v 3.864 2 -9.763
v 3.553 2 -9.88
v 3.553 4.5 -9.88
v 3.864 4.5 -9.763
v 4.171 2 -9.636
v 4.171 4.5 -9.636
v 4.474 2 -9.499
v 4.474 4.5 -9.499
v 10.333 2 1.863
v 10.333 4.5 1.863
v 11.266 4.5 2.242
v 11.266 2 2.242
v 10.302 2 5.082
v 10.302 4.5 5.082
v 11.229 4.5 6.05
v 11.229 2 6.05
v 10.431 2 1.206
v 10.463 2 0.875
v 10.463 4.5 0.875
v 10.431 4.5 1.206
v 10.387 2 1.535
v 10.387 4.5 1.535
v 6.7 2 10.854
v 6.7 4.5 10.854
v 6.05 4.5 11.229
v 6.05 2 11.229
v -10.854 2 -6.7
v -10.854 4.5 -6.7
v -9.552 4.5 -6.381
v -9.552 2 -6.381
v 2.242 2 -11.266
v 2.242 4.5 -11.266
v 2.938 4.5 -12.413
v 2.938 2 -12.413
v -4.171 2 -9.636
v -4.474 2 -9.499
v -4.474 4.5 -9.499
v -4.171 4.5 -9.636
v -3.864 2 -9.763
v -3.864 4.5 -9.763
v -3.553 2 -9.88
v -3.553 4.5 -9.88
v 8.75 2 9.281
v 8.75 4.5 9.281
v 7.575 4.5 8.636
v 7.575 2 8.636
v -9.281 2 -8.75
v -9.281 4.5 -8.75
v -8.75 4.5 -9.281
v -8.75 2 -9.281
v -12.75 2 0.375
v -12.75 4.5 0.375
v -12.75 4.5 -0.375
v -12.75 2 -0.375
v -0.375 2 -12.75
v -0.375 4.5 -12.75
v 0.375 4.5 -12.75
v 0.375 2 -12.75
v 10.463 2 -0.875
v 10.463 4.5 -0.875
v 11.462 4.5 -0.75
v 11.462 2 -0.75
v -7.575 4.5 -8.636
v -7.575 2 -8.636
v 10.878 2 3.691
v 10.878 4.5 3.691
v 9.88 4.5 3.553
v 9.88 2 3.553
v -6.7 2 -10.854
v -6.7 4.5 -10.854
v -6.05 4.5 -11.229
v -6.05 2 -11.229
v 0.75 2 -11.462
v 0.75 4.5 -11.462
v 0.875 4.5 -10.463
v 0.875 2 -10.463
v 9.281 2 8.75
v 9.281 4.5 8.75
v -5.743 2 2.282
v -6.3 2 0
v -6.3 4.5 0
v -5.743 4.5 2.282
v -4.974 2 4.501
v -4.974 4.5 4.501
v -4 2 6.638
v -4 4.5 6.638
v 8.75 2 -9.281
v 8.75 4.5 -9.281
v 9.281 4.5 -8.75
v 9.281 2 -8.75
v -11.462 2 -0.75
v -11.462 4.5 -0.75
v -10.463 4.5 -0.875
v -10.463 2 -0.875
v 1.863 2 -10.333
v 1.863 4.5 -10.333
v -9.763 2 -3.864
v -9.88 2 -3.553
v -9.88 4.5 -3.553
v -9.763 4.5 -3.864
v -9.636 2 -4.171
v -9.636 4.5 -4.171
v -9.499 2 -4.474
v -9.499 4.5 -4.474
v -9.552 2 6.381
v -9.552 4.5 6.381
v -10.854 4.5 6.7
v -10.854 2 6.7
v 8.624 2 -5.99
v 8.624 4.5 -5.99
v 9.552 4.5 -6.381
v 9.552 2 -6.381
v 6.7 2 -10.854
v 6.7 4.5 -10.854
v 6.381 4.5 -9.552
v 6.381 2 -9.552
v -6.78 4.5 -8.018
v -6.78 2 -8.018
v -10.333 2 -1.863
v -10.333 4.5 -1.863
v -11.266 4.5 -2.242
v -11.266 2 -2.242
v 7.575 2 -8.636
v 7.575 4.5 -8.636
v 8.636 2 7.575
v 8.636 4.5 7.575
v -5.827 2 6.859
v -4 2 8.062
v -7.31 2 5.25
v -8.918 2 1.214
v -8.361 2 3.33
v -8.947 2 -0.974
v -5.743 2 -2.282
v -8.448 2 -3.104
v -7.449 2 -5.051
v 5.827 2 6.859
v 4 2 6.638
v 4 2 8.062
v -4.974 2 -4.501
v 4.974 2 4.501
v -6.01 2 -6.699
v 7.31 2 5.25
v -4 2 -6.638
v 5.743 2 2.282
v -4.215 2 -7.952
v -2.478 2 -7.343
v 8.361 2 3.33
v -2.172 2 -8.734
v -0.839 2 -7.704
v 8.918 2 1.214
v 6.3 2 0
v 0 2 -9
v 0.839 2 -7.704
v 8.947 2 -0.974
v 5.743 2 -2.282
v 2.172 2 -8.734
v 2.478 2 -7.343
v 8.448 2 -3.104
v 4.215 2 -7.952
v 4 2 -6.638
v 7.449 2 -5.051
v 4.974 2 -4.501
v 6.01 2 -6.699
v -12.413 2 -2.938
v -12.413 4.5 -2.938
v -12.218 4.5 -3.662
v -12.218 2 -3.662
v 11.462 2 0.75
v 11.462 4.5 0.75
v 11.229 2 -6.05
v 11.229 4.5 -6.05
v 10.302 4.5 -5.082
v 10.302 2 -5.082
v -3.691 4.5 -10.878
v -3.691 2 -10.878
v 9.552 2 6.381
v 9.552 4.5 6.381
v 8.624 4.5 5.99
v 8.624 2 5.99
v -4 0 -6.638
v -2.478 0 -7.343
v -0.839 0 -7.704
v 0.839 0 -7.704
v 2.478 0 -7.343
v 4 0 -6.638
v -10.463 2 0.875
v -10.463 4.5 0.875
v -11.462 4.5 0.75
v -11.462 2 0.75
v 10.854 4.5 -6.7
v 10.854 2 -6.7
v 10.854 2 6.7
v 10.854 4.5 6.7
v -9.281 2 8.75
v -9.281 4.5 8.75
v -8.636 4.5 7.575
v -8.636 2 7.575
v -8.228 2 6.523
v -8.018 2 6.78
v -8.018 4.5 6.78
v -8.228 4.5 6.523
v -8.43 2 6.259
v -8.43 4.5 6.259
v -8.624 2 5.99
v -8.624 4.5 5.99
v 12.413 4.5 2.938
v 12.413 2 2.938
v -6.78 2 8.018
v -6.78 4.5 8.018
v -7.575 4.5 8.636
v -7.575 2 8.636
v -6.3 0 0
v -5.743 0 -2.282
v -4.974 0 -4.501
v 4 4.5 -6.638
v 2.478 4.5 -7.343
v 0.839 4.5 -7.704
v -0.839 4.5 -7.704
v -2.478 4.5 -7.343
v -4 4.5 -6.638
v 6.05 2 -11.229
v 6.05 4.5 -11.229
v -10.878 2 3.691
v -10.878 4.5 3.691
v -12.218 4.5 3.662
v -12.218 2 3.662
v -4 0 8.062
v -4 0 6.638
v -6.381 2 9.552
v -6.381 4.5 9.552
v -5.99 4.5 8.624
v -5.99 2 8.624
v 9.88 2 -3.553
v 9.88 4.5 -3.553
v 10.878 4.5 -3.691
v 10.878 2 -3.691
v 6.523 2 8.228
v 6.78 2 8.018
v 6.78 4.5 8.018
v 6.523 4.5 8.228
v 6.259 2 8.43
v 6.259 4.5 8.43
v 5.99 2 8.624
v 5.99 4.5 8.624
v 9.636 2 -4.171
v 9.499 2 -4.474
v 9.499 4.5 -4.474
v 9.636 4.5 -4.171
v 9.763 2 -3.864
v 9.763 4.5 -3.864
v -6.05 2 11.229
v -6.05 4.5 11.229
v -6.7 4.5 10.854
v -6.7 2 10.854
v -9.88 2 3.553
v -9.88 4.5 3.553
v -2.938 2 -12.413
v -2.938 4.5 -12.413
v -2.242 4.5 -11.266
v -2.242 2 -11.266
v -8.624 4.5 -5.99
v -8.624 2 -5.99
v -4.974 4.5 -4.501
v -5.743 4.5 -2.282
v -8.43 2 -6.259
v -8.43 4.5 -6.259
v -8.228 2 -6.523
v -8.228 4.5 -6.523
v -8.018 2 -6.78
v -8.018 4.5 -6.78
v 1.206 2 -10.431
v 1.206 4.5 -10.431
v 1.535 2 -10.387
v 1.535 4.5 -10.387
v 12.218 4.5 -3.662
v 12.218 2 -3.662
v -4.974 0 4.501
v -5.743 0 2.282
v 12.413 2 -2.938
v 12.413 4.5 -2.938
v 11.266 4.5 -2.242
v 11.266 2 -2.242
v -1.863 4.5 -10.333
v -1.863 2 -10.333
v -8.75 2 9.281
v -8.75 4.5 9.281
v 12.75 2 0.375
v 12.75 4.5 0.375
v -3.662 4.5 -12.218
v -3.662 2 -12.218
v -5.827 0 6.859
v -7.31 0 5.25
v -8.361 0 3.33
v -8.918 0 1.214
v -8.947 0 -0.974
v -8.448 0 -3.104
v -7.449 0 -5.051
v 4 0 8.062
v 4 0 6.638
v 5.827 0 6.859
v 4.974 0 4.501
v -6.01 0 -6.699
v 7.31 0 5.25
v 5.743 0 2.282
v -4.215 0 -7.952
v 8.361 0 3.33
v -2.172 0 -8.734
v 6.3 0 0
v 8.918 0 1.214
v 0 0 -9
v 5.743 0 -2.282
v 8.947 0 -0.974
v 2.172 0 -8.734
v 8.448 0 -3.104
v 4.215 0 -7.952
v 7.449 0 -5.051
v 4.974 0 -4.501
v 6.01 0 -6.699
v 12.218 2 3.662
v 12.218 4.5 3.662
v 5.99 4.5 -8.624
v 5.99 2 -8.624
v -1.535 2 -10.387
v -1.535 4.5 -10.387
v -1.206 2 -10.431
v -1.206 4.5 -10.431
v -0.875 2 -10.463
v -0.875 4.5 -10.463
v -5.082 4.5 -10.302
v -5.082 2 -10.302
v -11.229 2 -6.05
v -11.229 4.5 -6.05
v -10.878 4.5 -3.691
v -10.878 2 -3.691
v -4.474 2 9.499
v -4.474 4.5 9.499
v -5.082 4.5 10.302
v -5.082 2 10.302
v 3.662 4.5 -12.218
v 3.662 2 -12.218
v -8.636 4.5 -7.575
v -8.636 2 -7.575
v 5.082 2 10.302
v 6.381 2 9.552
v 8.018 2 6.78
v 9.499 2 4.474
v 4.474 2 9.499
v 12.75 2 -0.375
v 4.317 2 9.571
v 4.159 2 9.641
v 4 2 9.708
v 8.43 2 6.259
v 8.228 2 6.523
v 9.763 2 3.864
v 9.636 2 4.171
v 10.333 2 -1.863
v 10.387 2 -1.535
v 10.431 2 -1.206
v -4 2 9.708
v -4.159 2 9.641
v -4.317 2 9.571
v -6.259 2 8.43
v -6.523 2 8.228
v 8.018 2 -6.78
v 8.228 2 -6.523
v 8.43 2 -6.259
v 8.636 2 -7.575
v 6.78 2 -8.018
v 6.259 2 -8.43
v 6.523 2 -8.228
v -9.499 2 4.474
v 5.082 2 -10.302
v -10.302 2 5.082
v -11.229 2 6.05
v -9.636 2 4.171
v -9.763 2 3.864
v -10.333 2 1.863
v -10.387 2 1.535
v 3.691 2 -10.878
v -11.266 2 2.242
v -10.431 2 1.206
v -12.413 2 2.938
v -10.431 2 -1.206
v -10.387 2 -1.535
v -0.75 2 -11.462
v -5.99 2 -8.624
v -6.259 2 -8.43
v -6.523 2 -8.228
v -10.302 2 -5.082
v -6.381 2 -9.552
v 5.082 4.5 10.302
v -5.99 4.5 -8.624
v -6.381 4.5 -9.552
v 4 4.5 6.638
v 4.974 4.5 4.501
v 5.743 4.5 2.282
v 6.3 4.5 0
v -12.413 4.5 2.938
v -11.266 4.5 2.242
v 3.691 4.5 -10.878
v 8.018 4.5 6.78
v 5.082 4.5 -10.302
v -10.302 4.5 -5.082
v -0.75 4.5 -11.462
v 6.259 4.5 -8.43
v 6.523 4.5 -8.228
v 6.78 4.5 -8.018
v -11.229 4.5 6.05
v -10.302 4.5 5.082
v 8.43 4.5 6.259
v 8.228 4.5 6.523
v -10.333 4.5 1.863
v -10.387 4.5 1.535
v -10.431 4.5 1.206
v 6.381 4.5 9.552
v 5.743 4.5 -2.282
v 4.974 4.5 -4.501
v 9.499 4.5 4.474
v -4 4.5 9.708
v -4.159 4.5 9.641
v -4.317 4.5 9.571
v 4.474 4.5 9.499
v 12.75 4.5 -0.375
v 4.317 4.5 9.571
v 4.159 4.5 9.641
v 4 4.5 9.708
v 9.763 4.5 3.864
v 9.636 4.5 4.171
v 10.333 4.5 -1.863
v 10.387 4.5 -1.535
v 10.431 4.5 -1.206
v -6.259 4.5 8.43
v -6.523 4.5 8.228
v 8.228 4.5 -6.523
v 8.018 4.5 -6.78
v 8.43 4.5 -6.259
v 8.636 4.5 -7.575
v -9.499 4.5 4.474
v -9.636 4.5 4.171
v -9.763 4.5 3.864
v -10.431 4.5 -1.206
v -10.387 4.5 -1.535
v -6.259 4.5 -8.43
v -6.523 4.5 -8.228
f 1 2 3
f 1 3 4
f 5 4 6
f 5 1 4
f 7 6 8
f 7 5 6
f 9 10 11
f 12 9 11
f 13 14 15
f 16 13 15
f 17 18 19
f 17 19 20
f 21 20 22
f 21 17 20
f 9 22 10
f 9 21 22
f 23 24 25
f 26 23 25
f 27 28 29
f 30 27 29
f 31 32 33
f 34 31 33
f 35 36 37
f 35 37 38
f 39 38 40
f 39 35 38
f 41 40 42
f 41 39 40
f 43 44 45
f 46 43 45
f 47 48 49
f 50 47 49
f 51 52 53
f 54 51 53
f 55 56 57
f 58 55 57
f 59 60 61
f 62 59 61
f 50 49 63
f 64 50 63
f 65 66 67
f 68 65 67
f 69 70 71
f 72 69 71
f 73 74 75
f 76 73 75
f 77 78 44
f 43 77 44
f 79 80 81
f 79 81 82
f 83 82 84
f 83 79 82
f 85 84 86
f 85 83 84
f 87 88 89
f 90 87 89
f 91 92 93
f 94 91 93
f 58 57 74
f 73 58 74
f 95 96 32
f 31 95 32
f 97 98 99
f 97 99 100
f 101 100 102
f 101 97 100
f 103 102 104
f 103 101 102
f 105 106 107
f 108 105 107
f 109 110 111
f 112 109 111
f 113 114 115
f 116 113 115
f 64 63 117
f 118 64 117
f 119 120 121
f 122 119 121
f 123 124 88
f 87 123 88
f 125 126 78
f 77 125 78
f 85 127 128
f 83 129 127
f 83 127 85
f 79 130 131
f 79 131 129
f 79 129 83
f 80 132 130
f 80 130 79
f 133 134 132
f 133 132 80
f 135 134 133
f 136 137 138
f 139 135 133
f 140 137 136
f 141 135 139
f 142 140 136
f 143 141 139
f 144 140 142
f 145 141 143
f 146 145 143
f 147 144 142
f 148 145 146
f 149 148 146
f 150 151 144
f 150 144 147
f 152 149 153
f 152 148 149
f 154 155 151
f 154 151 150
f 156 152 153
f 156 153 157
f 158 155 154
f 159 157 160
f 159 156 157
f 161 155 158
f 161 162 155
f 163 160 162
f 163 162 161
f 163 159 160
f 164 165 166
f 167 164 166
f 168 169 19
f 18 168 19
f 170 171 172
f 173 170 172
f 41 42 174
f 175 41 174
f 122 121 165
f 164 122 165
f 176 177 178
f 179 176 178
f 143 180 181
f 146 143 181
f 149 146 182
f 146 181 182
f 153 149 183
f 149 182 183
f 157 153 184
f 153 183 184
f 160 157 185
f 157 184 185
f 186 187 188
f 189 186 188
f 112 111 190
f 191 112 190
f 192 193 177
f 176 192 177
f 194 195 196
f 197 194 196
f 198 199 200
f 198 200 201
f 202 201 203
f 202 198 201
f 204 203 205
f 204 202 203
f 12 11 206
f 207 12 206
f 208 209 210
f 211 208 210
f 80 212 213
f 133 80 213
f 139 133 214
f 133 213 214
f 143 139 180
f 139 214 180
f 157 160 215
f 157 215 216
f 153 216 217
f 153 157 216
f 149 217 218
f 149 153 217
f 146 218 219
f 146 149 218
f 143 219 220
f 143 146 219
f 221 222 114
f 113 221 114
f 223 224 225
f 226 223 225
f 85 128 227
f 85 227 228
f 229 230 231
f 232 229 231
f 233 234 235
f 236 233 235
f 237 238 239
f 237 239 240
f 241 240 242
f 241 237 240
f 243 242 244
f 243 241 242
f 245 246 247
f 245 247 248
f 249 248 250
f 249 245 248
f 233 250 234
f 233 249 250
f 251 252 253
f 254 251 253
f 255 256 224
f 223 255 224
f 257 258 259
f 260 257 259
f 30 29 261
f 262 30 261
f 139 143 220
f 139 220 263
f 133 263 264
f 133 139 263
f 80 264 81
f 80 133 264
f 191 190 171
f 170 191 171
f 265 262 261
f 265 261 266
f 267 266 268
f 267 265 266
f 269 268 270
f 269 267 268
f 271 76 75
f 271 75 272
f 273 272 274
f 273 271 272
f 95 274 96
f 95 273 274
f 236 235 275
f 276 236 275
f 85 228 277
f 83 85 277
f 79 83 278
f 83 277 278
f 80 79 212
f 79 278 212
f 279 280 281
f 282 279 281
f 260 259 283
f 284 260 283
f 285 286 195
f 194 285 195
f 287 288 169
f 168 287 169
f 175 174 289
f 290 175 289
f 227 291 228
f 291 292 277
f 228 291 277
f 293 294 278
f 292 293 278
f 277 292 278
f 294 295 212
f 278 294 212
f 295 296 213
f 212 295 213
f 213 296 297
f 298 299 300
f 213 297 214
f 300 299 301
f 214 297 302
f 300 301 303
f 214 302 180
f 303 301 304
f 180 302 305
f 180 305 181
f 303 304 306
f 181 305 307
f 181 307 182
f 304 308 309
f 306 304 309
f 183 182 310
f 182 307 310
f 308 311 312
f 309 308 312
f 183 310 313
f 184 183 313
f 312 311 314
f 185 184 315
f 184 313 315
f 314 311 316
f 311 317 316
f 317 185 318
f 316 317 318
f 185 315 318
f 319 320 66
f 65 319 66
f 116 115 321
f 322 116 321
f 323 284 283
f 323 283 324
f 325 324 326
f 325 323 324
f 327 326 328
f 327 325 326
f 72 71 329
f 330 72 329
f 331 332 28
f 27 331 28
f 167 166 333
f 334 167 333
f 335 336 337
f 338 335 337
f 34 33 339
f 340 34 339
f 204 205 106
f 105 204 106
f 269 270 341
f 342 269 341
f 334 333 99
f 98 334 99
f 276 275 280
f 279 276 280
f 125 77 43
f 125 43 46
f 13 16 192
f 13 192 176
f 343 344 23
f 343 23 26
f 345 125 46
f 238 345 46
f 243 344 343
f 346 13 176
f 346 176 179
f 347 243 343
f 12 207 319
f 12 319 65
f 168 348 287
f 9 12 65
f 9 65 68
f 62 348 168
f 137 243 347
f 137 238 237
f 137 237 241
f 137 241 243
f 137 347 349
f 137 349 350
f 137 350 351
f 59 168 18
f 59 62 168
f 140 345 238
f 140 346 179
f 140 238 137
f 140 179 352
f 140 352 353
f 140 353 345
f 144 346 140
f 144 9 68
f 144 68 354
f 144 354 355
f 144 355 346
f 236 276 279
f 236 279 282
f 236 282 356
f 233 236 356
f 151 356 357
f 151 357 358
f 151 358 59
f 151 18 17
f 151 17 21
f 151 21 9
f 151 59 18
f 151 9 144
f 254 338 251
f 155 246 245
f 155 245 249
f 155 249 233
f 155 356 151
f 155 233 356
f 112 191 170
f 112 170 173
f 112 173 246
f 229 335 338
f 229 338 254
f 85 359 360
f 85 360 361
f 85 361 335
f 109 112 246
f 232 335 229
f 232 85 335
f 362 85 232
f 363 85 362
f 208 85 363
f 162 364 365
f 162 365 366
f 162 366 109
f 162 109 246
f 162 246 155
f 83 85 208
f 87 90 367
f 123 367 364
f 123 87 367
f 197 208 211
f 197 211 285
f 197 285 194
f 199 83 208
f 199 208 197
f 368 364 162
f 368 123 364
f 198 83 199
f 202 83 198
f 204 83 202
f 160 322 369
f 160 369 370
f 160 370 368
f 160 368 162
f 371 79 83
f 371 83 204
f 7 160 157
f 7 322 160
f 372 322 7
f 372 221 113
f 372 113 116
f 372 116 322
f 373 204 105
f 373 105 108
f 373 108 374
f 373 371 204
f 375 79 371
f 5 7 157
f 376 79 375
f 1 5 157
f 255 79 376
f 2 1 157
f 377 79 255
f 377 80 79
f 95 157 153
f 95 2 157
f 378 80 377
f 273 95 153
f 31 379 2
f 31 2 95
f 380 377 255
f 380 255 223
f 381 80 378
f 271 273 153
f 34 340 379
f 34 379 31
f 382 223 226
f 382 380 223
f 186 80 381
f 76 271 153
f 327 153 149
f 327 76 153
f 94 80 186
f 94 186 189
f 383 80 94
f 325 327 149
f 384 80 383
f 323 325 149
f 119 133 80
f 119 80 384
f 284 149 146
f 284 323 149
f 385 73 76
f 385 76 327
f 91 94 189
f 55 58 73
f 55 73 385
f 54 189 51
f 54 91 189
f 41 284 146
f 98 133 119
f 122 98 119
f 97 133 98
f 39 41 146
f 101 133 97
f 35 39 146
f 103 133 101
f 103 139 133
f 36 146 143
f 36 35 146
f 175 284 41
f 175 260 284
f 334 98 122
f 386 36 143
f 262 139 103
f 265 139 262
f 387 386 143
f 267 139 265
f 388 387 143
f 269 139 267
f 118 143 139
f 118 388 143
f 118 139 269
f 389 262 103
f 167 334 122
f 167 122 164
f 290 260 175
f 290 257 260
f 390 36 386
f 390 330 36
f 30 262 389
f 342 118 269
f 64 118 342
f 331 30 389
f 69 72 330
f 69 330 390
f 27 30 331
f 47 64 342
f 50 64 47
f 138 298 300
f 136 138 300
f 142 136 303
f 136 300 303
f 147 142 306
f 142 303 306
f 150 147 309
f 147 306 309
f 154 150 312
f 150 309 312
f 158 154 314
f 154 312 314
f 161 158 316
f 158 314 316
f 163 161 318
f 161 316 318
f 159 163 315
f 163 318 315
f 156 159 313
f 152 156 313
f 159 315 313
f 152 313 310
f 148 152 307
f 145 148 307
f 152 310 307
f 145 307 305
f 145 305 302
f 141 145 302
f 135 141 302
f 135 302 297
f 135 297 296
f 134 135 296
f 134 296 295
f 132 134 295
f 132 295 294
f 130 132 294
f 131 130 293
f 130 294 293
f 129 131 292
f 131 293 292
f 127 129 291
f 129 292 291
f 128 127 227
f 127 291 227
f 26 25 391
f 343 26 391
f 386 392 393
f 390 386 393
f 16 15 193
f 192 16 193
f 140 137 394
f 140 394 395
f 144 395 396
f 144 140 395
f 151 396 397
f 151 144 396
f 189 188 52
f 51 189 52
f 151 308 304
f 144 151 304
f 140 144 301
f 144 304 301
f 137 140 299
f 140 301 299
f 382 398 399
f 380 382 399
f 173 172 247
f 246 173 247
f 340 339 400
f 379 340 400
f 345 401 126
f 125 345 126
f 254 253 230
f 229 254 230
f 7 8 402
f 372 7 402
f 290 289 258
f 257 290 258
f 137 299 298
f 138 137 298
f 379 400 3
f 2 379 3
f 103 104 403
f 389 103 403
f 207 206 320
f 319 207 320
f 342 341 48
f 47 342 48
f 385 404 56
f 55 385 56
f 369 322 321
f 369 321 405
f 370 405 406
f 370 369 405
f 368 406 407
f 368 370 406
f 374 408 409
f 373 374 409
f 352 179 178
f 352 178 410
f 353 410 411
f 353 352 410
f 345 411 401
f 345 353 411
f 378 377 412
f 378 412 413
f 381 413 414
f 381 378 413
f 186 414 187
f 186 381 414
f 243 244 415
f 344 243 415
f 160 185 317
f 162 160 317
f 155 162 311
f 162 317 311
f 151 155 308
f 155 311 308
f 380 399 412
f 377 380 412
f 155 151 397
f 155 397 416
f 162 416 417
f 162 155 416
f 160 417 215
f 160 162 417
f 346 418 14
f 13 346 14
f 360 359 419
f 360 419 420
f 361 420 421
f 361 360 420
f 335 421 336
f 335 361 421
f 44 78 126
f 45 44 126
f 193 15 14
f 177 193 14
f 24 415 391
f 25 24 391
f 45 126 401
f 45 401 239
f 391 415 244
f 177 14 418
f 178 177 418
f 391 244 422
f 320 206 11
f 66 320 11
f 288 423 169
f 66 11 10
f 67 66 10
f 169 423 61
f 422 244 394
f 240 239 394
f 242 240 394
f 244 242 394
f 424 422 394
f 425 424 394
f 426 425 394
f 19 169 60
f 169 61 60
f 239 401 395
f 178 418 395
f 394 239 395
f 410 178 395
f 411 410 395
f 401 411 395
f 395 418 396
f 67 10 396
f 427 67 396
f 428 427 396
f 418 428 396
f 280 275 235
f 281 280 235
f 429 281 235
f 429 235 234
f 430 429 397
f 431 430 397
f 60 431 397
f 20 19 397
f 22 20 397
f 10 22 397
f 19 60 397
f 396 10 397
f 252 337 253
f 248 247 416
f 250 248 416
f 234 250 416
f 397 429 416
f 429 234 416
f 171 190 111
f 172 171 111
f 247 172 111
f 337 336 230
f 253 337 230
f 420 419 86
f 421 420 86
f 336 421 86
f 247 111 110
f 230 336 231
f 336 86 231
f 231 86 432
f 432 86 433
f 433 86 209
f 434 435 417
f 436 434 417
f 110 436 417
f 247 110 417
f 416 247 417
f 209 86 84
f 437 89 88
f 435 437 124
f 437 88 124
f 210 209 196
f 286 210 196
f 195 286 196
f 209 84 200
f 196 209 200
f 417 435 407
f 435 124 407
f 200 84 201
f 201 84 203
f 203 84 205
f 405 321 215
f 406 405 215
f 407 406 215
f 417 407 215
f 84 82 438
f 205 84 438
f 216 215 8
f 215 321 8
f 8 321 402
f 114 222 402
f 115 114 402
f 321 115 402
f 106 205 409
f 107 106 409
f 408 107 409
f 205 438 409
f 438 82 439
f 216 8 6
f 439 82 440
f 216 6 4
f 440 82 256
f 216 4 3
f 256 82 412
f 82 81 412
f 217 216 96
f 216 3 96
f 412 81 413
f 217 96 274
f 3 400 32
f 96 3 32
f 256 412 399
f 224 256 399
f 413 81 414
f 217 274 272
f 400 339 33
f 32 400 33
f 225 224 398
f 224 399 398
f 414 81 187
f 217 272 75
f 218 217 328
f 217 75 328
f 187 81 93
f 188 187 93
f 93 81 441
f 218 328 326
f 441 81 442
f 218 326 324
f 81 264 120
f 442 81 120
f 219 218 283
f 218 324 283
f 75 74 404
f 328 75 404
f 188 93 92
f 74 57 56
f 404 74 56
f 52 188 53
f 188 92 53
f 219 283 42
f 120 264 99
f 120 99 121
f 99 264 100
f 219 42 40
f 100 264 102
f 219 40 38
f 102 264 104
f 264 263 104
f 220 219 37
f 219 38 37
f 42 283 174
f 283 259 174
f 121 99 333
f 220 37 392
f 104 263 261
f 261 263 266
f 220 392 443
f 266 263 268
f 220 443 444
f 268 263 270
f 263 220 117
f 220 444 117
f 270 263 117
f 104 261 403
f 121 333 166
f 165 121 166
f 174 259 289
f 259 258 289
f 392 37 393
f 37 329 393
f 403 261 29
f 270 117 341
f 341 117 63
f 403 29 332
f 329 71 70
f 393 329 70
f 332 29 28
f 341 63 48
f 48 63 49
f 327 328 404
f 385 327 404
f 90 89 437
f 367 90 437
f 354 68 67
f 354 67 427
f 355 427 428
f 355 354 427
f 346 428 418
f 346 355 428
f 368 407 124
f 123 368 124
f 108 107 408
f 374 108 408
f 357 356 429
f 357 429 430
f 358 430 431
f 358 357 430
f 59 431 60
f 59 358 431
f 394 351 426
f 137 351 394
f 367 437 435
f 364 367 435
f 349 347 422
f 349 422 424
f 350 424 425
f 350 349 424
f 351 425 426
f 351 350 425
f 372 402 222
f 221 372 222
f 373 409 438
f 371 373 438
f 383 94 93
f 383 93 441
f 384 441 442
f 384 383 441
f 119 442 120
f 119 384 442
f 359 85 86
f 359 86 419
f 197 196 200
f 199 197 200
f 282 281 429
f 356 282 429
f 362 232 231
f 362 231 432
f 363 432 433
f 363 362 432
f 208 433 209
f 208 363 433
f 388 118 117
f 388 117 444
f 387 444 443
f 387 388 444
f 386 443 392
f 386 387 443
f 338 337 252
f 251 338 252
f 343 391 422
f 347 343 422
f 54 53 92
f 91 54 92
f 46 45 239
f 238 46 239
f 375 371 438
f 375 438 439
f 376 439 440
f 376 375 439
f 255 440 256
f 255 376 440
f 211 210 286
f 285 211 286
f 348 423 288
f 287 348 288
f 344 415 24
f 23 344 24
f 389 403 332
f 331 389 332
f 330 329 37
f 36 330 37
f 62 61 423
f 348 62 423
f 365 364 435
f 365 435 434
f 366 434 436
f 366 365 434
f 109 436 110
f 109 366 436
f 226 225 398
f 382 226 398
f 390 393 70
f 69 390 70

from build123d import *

# Parameters (mm, degrees)
BOSS_EXTRUDE1_DEPTH = 2
BOSS_EXTRUDE2_DEPTH = 2.5
BOSS_EXTRUDE5_DEPTH = 2.5
CIRPATTERN2_COUNT   = 24


with BuildPart() as part:
    # Sketch1 → Boss-Extrude1 (new body)
    with BuildSketch(Plane(origin=(0, 0, 0), x_dir=(1, 0, 0), z_dir=(0, 1, 0))):
        with BuildLine():
            Line((-4, -8.062257748), (-4, -6.637959024))
            ThreePointArc((-4, -6.637959024), (-5.384324957, -3.400171245), (-6.3, 0))
            ThreePointArc((-6.3, 0), (-5.384324957, 3.400171245), (-4, 6.637959024))
            ThreePointArc((-4, 6.637959024), (0, 7.75), (4, 6.637959024))
            ThreePointArc((4, 6.637959024), (5.384324957, 3.400171245), (6.3, 0))
            ThreePointArc((6.3, 0), (5.384324957, -3.400171245), (4, -6.637959024))
            Line((4, -6.637959024), (4, -8.062257748))
            ThreePointArc((4, -8.062257748), (0, 9), (-4, -8.062257748))
        make_face()
    extrude(amount=BOSS_EXTRUDE1_DEPTH)


with BuildPart() as body_2:
    # Sketch2 → Boss-Extrude2 (new body)
    with BuildSketch(Plane(origin=(0, 2, 0), x_dir=(1, 0, 0), z_dir=(0, 1, 0))):
        with BuildLine():
            Line((4, -9.708243919), (4, -8.062257748))
            Line((4, -8.062257748), (4, -6.637959024))
            ThreePointArc((4, -6.637959024), (5.384324957, -3.400171245), (6.3, 0))
            ThreePointArc((6.3, 0), (5.384324957, 3.400171245), (4, 6.637959024))
            ThreePointArc((4, 6.637959024), (0, 7.75), (-4, 6.637959024))
            ThreePointArc((-4, 6.637959024), (-5.384324957, 3.400171245), (-6.3, 0))
            ThreePointArc((-6.3, 0), (-5.384324957, -3.400171245), (-4, -6.637959024))
            Line((-4, -6.637959024), (-4, -8.062257748))
            Line((-4, -8.062257748), (-4, -9.708243919))
            ThreePointArc((-4, -9.708243919), (0, 10.5), (4, -9.708243919))
        make_face()
    extrude(amount=BOSS_EXTRUDE2_DEPTH)

    # Sketch7 → Boss-Extrude5 (add)
    with BuildSketch(Plane(origin=(0, 4.5, 0), x_dir=(1, 0, 0), z_dir=(0, 1, 0))):
        with BuildLine():
            Line((-0.375, 12.75), (0.375, 12.75))
            Line((0.375, 12.75), (0.75, 11.462442433))
            Line((0.75, 11.462442433), (0.875, 10.46347815))
            ThreePointArc((0.875, 10.46347815), (0, 10.5), (-0.875, 10.46347815))
            Line((-0.875, 10.46347815), (-0.75, 11.462442433))
            Line((-0.75, 11.462442433), (-0.375, 12.75))
        make_face()
    boss_extrude5 = extrude(amount=-BOSS_EXTRUDE5_DEPTH)

    # CirPattern2: Boss-Extrude5 ×24 about axis, 3 skipped
    cirpattern2_axis = Axis((0, 0, 0), (0, 1, 0))
    add([boss_extrude5.rotate(cirpattern2_axis, i * 360 / CIRPATTERN2_COUNT) for i in range(1, CIRPATTERN2_COUNT) if i not in (11, 12, 13)])


solid = Compound([part.part, body_2.part])
